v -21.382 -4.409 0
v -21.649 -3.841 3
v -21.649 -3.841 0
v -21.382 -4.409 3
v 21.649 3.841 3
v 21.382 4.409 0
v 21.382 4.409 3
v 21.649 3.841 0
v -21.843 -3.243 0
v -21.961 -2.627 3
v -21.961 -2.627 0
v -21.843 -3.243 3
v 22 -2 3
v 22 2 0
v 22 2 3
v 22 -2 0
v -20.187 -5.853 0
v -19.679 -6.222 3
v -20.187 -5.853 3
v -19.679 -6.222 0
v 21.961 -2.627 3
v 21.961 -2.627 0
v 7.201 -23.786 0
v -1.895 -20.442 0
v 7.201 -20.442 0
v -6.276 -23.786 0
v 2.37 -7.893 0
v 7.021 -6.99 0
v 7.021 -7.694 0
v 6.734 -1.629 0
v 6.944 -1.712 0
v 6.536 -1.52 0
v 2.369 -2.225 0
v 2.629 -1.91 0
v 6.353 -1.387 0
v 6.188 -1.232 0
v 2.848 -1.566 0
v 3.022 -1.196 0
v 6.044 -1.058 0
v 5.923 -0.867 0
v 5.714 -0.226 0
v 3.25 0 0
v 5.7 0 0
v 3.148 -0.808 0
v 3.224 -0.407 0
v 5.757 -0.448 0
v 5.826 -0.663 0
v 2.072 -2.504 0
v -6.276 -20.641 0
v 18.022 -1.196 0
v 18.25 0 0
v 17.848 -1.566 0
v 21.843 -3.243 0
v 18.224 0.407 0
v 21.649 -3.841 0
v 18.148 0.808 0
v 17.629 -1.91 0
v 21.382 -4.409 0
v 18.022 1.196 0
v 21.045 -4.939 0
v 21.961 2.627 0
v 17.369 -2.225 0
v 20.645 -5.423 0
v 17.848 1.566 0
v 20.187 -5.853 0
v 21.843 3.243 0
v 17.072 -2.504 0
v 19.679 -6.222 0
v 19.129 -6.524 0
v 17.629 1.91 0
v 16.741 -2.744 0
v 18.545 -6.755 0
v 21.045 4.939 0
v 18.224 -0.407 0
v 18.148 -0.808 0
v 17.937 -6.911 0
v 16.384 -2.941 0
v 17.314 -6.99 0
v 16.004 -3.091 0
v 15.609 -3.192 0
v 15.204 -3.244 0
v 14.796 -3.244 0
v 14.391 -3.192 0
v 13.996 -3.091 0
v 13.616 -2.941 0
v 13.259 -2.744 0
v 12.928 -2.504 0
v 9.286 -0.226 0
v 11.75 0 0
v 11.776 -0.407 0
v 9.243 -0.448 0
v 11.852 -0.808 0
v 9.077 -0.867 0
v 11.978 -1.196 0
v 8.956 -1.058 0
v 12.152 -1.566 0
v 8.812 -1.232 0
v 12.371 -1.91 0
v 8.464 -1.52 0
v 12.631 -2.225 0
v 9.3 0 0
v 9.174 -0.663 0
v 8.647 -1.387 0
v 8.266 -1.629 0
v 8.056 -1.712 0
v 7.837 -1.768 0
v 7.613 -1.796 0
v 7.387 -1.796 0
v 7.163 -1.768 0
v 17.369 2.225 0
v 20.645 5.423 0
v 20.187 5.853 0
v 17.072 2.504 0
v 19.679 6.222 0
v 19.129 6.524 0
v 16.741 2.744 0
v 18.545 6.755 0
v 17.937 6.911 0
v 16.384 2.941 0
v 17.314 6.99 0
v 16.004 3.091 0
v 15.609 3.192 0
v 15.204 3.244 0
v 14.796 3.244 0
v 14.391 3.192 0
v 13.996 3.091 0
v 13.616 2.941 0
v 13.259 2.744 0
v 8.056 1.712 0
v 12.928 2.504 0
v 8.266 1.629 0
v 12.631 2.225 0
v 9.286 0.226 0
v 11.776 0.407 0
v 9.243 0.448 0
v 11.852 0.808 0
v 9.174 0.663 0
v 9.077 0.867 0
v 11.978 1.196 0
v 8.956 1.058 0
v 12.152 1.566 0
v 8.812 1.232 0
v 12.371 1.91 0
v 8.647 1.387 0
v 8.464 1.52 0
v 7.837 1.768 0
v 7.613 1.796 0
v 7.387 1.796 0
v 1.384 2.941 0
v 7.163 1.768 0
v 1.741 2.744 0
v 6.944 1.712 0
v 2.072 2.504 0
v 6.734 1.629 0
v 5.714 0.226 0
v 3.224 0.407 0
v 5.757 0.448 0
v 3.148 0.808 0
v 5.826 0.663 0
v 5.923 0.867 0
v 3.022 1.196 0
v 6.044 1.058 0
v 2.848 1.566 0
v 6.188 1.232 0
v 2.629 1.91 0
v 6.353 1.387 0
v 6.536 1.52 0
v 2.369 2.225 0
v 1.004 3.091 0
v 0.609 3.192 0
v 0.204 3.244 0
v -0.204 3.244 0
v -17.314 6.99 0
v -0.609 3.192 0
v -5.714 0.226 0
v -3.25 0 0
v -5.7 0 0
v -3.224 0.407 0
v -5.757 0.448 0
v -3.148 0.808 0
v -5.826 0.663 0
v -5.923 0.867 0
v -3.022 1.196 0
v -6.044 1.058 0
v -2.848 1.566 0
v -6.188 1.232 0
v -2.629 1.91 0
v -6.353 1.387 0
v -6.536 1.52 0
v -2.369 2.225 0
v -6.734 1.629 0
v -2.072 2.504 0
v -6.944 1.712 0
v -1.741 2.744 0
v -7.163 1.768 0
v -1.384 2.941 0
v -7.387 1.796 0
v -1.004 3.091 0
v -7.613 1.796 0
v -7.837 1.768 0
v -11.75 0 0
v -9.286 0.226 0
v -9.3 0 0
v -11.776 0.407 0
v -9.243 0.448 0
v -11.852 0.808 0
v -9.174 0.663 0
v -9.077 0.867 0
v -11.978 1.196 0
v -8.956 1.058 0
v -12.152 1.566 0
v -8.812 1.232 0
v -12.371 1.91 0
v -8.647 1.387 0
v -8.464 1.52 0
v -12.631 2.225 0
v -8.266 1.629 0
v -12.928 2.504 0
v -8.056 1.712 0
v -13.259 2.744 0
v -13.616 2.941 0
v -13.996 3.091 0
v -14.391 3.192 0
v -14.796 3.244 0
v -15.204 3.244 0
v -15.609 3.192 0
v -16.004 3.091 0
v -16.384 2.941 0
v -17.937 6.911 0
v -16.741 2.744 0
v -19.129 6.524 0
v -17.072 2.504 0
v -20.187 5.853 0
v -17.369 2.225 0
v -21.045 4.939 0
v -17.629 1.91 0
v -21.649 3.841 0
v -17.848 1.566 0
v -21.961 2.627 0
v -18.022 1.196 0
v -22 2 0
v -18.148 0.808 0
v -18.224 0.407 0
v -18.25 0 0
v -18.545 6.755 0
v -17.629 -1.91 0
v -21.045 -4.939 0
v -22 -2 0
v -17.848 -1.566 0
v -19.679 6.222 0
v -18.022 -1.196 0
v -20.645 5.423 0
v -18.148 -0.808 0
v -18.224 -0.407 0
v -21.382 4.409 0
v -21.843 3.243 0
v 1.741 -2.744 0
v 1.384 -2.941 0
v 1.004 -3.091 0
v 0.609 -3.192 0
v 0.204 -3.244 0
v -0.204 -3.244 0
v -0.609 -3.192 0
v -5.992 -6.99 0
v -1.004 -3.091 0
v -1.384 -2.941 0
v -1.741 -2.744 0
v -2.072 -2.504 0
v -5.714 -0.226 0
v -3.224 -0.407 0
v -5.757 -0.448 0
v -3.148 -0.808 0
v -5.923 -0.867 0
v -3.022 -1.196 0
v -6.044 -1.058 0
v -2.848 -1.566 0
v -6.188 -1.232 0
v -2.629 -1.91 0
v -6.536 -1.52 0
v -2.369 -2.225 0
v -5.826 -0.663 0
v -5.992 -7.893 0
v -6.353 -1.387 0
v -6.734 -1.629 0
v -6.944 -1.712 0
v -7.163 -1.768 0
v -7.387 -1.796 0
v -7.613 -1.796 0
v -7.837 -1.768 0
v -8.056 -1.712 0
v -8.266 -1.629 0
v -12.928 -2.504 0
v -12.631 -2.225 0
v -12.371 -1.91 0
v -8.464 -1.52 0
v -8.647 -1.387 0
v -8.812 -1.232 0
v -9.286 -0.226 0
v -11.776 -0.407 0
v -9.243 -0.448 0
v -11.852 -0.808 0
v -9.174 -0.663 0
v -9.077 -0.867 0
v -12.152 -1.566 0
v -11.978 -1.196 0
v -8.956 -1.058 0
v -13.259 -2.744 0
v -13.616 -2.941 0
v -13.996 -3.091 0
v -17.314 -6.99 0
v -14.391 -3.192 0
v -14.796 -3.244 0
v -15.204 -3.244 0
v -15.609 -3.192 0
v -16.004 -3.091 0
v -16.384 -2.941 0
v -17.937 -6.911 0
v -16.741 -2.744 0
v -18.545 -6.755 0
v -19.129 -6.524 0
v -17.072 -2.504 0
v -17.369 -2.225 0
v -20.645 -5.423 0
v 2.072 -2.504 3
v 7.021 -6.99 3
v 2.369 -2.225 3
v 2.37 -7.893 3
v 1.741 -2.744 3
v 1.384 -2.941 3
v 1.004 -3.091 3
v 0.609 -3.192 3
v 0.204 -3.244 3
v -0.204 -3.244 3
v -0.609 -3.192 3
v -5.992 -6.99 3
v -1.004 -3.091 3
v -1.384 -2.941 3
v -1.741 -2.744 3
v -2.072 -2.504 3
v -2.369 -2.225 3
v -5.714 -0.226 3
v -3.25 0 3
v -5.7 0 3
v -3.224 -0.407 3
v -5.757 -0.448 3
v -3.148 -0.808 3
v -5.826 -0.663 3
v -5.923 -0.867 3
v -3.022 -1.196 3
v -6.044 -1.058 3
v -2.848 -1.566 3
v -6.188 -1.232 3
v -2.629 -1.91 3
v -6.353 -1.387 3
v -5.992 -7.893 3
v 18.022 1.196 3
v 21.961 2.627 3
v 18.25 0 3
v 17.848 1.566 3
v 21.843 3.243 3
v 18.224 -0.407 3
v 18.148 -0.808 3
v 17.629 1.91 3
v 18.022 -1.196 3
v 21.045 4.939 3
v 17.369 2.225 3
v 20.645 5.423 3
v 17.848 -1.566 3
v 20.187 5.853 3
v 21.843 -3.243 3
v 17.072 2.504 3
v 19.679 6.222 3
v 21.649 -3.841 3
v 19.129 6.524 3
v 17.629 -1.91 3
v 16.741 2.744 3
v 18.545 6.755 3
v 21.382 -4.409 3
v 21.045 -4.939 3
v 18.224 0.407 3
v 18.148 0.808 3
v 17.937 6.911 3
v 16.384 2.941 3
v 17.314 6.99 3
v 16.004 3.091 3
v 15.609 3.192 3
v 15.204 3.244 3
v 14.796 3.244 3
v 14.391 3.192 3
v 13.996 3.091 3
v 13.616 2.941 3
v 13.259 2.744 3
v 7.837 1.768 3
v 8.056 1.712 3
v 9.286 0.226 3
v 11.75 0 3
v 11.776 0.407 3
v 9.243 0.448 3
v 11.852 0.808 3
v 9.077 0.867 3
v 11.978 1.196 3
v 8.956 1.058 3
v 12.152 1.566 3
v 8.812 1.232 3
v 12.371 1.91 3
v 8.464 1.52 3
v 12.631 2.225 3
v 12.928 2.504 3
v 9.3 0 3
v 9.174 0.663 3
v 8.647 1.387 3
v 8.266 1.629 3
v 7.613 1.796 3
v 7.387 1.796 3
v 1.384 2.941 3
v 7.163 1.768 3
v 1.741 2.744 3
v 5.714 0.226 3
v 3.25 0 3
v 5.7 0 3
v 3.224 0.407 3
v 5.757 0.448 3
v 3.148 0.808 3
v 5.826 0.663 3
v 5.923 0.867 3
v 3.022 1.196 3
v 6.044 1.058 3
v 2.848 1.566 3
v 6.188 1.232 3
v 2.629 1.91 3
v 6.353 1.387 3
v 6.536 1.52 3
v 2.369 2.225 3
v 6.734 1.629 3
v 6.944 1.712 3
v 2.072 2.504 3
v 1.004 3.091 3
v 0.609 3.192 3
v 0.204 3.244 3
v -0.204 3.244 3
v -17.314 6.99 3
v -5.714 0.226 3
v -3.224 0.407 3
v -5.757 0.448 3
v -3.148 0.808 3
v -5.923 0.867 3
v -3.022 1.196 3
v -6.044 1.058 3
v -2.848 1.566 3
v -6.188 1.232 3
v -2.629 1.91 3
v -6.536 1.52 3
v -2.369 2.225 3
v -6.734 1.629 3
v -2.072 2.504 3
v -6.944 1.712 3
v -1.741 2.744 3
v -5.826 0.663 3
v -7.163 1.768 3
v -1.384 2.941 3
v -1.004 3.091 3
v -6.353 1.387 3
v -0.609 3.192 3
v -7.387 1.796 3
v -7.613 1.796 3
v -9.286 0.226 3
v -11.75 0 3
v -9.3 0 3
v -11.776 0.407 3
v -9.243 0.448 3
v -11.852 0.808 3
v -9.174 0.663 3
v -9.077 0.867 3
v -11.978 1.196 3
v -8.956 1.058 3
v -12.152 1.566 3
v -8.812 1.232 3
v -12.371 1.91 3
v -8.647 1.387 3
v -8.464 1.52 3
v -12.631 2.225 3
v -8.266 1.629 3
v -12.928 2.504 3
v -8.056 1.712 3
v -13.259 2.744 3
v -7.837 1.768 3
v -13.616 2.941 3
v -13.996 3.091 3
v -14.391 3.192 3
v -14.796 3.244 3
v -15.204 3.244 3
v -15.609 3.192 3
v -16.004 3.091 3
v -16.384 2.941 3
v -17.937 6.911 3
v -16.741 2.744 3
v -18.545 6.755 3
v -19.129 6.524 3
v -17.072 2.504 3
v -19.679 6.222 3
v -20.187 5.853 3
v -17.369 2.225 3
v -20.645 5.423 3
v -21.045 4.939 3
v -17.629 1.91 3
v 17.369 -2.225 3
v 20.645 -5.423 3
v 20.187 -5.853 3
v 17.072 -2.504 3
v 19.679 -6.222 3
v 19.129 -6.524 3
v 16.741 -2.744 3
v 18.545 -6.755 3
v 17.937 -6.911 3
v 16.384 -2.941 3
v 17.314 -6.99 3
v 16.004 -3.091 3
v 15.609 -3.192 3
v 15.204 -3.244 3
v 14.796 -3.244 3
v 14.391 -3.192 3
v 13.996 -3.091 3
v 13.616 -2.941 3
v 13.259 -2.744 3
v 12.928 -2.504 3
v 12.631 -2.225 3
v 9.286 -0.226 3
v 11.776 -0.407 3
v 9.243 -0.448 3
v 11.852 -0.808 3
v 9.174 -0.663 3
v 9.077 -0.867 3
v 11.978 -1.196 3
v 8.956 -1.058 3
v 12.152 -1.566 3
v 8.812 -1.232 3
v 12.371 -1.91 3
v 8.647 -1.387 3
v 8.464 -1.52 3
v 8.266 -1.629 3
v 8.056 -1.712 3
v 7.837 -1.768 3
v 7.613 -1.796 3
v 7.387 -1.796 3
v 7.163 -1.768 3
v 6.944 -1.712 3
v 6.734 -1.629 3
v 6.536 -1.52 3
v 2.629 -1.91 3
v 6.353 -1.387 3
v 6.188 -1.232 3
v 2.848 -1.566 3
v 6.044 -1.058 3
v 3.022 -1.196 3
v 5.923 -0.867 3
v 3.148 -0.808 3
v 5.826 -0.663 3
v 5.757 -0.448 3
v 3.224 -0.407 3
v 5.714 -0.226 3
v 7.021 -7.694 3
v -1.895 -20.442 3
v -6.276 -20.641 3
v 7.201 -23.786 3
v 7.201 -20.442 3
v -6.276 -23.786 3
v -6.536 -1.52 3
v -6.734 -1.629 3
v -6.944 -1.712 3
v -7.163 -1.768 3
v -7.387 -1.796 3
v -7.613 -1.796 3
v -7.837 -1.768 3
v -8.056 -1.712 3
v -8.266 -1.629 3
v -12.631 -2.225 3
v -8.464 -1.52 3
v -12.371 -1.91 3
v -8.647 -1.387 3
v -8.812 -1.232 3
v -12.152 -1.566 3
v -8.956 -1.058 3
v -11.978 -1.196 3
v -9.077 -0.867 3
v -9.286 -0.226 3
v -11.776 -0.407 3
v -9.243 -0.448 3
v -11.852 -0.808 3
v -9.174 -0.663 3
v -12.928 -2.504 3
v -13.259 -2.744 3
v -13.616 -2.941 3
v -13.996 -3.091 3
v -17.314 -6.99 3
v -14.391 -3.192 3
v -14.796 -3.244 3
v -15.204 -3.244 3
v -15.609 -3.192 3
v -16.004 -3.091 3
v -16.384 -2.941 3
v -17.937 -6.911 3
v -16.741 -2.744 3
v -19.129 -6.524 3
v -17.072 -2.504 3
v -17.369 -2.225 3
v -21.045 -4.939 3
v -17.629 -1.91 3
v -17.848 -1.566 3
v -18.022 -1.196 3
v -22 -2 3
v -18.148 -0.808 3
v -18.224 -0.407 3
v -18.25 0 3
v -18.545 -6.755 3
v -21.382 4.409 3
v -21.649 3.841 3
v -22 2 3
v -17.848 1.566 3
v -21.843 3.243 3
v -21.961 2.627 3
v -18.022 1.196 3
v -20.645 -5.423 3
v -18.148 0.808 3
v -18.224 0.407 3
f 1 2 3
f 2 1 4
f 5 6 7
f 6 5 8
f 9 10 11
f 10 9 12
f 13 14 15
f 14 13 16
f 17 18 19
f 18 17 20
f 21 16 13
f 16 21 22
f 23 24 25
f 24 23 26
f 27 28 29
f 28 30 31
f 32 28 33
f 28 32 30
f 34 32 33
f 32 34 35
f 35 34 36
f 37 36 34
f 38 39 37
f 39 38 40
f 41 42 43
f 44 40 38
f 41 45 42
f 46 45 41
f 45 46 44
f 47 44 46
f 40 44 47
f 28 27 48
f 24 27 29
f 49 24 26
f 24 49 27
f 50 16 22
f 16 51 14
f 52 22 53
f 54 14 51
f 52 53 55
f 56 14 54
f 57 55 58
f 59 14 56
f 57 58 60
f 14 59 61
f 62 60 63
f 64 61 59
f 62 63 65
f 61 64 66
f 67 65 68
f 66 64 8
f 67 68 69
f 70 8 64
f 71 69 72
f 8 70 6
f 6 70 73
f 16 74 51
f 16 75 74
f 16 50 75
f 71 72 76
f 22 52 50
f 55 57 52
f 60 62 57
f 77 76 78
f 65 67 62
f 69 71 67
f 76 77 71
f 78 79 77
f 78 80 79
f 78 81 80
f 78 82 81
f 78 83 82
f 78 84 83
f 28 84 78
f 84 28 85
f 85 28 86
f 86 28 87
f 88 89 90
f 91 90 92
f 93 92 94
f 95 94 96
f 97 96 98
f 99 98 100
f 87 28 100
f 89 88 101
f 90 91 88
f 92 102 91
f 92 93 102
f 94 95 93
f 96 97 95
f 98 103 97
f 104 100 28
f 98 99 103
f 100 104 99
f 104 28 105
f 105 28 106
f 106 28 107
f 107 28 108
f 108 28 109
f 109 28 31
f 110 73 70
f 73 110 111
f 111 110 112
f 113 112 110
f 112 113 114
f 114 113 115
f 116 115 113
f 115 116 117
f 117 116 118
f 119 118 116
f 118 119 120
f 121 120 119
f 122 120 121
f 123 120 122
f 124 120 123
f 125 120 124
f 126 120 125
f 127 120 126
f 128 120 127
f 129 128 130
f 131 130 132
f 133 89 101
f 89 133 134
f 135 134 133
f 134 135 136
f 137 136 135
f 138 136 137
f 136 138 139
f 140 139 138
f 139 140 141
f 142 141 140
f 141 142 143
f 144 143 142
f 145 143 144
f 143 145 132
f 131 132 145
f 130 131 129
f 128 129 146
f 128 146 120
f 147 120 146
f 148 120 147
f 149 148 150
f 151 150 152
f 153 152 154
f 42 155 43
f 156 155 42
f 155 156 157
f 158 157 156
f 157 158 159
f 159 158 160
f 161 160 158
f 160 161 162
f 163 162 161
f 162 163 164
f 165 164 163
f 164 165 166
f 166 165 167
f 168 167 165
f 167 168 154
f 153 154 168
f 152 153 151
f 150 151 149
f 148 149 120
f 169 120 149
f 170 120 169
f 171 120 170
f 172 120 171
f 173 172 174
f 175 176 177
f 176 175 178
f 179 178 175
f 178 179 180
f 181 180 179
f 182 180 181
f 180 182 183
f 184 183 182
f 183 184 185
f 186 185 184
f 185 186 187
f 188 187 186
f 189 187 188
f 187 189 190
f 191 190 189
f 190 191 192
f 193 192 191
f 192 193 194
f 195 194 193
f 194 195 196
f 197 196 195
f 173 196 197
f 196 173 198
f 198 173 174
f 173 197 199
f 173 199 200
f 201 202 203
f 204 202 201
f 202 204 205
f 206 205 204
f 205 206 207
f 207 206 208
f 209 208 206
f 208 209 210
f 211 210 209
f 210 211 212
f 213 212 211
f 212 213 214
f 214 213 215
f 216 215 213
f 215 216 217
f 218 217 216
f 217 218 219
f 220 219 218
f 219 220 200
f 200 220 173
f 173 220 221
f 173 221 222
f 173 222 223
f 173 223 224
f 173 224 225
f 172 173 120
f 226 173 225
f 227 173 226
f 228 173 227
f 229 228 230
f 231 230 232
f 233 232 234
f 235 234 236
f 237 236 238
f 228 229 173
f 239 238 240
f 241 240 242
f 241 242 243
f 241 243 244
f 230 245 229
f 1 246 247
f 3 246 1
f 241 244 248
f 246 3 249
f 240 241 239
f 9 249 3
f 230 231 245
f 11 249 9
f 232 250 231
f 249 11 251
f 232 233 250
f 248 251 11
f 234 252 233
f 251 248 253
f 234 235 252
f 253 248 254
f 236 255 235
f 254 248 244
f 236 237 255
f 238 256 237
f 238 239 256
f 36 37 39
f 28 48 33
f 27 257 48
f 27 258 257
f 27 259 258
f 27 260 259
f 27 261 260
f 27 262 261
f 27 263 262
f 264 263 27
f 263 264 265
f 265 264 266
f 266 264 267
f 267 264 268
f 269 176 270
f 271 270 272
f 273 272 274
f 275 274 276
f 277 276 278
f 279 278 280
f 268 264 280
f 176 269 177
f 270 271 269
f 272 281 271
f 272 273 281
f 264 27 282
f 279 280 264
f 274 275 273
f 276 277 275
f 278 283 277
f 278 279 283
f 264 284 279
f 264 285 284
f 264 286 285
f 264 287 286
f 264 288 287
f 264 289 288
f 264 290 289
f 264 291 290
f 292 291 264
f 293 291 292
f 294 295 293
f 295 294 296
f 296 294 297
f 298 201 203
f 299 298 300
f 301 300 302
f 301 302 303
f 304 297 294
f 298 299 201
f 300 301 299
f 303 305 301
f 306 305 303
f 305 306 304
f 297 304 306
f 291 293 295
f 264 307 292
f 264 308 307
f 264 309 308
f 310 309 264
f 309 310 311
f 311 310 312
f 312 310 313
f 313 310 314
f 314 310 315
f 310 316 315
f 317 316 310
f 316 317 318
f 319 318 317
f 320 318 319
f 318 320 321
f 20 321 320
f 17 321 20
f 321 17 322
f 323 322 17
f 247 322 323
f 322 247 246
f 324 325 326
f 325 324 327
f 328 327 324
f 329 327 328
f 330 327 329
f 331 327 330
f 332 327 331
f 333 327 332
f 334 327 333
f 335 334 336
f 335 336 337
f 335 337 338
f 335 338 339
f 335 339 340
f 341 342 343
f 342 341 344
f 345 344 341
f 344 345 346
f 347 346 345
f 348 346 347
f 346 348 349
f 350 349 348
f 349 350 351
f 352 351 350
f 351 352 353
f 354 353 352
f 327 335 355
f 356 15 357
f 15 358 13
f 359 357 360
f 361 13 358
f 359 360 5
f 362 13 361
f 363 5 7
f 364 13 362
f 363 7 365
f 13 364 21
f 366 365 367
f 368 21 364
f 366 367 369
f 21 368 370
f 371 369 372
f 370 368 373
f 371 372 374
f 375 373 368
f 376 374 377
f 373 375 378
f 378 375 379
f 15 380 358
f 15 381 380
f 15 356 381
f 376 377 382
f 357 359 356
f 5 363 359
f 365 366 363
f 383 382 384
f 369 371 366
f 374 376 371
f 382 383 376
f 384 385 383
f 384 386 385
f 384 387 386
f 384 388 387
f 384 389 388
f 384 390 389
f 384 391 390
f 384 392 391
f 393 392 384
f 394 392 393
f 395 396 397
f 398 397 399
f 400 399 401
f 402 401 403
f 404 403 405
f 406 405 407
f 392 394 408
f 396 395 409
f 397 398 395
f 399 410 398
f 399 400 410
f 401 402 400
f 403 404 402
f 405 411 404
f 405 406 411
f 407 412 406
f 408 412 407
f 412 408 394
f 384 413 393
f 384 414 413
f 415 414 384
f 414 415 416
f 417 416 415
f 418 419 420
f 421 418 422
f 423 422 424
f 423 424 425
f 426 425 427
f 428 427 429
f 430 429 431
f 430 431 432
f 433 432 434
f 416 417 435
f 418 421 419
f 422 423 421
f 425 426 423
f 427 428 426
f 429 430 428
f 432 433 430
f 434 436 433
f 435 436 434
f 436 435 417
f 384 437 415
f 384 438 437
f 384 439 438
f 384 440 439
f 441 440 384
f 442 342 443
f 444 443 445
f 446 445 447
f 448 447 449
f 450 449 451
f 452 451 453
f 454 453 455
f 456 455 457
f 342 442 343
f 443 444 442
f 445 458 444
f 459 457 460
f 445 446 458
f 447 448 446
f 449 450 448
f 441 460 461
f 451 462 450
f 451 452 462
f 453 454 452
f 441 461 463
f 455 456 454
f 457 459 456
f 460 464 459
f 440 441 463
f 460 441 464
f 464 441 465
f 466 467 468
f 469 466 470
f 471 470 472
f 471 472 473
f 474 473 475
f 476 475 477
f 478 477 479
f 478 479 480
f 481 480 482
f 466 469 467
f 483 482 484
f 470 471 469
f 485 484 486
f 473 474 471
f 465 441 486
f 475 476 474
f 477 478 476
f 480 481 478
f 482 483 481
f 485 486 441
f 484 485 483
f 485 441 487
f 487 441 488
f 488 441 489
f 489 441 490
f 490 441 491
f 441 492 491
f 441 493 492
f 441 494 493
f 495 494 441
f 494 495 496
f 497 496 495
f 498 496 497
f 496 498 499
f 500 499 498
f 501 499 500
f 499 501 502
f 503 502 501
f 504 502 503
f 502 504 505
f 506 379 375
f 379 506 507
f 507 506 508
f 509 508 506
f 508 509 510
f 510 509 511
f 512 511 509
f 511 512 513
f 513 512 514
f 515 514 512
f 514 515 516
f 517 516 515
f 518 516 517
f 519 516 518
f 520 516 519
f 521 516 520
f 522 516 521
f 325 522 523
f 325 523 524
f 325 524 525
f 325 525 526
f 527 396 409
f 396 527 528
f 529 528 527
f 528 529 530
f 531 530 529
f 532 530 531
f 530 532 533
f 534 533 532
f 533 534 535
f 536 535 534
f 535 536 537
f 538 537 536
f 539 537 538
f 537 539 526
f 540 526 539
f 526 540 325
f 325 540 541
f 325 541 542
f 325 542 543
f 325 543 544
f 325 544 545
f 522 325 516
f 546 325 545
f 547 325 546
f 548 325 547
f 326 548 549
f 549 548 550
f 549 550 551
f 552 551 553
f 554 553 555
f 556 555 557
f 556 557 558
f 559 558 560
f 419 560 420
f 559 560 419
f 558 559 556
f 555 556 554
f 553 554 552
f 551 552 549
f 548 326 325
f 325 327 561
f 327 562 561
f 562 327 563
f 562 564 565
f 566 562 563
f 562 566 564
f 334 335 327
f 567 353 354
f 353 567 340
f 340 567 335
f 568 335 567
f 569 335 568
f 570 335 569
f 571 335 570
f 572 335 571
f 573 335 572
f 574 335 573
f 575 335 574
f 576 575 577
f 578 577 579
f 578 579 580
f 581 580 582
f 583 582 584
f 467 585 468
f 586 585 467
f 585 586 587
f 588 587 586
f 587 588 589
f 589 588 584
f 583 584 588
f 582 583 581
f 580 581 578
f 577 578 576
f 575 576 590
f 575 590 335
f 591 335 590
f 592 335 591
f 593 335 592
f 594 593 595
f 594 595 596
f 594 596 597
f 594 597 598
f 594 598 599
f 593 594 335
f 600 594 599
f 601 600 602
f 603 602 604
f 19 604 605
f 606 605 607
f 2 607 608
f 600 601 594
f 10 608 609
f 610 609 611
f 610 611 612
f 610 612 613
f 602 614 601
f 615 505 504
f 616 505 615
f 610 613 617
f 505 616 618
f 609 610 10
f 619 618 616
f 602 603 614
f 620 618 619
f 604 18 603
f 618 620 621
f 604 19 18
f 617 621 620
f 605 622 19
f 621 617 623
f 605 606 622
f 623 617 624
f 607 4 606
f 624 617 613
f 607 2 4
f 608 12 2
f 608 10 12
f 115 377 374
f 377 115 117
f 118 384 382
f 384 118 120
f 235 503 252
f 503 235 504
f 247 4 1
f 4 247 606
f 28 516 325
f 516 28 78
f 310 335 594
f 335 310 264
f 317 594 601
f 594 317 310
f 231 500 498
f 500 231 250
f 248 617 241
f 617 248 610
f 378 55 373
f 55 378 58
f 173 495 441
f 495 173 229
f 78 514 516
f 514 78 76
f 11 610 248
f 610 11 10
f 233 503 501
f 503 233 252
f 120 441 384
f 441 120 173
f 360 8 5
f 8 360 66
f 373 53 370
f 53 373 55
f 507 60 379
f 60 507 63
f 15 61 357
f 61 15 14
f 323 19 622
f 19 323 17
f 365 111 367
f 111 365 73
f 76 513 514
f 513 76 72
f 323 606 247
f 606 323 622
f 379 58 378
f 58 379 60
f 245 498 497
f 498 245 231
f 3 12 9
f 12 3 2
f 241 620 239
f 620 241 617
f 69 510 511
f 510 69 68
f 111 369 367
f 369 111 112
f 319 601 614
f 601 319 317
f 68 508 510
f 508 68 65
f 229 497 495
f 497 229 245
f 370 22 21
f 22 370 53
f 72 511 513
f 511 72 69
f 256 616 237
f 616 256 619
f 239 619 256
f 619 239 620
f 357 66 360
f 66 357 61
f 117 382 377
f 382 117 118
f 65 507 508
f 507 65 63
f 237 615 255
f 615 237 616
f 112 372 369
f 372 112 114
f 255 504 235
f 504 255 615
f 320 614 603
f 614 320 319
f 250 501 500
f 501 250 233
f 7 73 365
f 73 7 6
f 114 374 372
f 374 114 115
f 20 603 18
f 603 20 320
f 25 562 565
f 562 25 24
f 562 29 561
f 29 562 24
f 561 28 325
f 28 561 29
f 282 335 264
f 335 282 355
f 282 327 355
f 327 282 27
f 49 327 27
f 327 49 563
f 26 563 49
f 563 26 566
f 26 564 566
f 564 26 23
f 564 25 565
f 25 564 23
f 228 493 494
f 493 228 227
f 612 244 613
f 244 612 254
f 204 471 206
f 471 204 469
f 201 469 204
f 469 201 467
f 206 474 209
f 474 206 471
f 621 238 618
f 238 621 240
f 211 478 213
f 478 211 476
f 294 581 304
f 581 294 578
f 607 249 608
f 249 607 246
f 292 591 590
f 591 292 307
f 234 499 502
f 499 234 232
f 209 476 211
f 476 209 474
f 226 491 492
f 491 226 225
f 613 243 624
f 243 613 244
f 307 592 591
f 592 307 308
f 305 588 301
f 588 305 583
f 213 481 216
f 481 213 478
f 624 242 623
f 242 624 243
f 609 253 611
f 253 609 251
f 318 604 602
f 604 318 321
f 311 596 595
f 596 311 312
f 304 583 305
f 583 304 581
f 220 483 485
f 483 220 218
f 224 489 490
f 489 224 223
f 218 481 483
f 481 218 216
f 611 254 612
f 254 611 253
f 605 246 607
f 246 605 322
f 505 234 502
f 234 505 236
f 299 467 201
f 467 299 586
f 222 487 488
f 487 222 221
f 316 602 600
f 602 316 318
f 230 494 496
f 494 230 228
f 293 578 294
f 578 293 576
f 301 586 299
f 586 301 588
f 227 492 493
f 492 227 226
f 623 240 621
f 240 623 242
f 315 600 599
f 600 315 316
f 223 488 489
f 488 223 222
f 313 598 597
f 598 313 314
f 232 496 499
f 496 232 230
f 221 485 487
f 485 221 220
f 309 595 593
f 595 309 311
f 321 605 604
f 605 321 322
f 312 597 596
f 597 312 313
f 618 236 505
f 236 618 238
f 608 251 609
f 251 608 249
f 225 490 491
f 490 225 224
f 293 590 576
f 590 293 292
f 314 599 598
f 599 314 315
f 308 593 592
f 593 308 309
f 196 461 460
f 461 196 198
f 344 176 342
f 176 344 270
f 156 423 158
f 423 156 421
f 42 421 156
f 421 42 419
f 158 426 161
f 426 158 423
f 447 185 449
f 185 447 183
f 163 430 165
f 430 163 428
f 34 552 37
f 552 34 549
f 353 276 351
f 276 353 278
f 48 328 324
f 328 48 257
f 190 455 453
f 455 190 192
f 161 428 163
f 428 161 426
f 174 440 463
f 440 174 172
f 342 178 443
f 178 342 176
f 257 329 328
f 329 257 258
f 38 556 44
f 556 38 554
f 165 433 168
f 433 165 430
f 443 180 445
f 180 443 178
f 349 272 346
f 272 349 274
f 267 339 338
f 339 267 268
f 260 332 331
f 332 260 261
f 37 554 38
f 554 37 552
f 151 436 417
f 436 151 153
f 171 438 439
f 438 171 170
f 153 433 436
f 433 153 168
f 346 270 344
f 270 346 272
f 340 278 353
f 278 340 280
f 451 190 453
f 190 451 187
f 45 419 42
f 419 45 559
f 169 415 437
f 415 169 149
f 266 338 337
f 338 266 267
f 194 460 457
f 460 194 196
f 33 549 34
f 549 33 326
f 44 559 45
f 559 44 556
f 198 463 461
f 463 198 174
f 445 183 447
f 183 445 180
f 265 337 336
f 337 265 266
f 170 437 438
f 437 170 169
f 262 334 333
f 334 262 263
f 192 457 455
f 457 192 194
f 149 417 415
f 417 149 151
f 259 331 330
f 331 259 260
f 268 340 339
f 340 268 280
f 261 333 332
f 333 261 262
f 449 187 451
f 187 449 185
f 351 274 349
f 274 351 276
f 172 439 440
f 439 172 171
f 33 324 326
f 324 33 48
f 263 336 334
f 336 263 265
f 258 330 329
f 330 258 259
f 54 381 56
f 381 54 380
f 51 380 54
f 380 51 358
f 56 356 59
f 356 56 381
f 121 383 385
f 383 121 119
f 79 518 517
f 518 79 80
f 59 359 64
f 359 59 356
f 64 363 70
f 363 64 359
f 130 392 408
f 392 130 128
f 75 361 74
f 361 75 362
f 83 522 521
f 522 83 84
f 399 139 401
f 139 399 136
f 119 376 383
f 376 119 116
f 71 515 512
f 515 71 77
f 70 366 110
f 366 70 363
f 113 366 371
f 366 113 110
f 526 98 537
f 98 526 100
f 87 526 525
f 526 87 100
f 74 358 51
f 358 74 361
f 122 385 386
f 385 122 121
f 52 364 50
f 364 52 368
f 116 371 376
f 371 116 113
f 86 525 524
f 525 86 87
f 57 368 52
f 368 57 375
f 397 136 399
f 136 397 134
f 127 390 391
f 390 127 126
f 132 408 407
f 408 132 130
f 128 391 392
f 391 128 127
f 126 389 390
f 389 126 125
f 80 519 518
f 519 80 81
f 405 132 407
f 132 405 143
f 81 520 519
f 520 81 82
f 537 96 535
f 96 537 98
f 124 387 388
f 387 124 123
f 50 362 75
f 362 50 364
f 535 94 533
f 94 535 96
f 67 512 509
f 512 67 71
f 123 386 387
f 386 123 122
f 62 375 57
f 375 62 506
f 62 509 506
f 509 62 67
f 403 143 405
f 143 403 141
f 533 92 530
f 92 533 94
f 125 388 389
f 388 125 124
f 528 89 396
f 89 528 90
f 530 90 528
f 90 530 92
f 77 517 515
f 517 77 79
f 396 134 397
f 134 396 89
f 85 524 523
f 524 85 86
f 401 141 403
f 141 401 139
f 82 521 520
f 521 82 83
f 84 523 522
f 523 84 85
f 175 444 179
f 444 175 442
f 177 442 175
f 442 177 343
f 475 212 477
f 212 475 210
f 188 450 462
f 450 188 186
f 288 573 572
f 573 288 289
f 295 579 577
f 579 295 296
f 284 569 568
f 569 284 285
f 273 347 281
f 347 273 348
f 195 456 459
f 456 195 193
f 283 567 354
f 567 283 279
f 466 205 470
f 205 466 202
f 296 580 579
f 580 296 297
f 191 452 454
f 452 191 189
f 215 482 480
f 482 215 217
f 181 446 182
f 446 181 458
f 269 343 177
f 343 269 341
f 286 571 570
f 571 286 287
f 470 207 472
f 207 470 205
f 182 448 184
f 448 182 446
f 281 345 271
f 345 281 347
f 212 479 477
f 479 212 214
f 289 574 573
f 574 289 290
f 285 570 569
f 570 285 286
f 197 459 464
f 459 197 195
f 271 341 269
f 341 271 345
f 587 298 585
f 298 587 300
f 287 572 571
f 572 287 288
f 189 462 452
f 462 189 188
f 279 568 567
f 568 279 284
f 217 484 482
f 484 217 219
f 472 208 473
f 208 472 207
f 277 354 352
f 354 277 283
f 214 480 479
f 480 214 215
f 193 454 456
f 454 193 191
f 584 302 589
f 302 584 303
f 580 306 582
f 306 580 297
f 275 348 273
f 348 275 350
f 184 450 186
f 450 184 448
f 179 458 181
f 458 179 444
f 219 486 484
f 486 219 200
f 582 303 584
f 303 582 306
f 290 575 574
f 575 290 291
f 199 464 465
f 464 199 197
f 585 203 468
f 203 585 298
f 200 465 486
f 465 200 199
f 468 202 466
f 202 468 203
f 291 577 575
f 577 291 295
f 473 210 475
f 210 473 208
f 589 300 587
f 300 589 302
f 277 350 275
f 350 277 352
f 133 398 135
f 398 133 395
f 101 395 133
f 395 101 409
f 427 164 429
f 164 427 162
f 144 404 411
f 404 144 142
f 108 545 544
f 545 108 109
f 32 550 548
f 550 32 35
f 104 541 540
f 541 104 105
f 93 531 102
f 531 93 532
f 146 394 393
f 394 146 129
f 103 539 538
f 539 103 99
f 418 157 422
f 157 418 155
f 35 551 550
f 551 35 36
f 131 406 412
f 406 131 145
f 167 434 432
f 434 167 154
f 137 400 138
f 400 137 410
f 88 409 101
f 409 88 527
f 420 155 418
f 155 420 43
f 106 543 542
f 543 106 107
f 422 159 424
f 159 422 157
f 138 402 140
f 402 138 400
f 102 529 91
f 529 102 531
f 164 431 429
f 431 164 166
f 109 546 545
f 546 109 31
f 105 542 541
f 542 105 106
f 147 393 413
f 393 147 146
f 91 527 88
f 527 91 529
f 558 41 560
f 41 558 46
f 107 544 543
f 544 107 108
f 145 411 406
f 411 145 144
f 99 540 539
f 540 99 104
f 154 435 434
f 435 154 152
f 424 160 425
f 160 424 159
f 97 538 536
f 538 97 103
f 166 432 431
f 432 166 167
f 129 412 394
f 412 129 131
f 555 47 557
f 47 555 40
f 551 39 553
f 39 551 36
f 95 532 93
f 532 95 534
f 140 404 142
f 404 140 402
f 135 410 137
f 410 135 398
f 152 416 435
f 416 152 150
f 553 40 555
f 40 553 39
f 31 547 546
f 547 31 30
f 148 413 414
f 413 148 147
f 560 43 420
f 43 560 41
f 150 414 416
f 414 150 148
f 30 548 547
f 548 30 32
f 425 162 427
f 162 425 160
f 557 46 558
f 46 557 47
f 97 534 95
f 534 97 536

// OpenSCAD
$fn = 50;


difference() {
	union() {
		hull() {
			translate(v = [-17.0000000000, 2.0000000000, 0]) {
				cylinder(h = 3, r = 5);
			}
			translate(v = [17.0000000000, 2.0000000000, 0]) {
				cylinder(h = 3, r = 5);
			}
			translate(v = [-17.0000000000, -2.0000000000, 0]) {
				cylinder(h = 3, r = 5);
			}
			translate(v = [17.0000000000, -2.0000000000, 0]) {
				cylinder(h = 3, r = 5);
			}
		}
		translate(v = [0, -5, 0]) {
			linear_extrude(height = 3) {
				text(font = "DejaVu Sans Mono:style=Bold", halign = "center", size = 19.0000000000, text = "Z", valign = "top");
			}
		}
	}
	union() {
		translate(v = [-15.0000000000, 0.0000000000, 0]) {
			translate(v = [0, 0, -100]) {
				cylinder(h = 200, r = 3.2500000000);
			}
		}
		translate(v = [0, 0, -100]) {
			cylinder(h = 200, r = 3.2500000000);
		}
		translate(v = [15.0000000000, 0.0000000000, 0]) {
			translate(v = [0, 0, -100]) {
				cylinder(h = 200, r = 3.2500000000);
			}
		}
		translate(v = [-15.0000000000, 0.0000000000, 0]) {
			translate(v = [0, 0, -100]) {
				cylinder(h = 200, r = 1.8000000000);
			}
		}
		translate(v = [-7.5000000000, 0.0000000000, 0]) {
			translate(v = [0, 0, -100]) {
				cylinder(h = 200, r = 1.8000000000);
			}
		}
		translate(v = [0, 0, -100]) {
			cylinder(h = 200, r = 1.8000000000);
		}
		translate(v = [7.5000000000, 0.0000000000, 0]) {
			translate(v = [0, 0, -100]) {
				cylinder(h = 200, r = 1.8000000000);
			}
		}
		translate(v = [15.0000000000, 0.0000000000, 0]) {
			translate(v = [0, 0, -100]) {
				cylinder(h = 200, r = 1.8000000000);
			}
		}
	}
}
